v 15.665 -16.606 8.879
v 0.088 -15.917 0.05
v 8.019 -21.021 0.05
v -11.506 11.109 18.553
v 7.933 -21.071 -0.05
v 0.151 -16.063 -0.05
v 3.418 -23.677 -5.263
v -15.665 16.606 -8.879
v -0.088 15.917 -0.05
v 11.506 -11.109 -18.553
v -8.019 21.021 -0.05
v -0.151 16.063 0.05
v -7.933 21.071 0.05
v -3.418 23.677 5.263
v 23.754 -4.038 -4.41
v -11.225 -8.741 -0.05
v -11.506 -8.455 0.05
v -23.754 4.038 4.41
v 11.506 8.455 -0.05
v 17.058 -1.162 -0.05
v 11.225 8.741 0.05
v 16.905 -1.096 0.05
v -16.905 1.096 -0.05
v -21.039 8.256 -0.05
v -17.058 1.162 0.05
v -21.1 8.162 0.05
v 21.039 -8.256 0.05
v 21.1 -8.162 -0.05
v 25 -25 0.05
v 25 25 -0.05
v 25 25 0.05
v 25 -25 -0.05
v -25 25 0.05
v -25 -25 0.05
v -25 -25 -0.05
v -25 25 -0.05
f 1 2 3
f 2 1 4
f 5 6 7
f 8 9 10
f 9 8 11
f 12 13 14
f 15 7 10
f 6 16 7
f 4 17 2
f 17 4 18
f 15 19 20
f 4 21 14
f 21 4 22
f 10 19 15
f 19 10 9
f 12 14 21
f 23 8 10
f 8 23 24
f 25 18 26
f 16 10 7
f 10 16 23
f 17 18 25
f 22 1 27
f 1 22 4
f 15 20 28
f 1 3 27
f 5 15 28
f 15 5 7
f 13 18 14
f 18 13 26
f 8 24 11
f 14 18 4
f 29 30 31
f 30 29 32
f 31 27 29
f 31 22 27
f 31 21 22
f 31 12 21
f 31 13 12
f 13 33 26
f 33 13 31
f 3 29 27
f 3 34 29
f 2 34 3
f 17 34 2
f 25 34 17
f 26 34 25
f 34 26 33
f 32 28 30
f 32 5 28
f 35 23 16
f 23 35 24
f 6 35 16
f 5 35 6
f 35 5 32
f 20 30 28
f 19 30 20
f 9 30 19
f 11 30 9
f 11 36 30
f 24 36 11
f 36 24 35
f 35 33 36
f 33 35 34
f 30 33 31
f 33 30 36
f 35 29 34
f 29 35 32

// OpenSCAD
cube_1_width = 20;
cube_1_depth = 40;
cube_1_height = 20;

buildplate_1_width = 50;
buildplate_1_depth = 50;
buildplate_1_height = 0.1;


rotate([20,-45,30])
cube([cube_1_width,
      cube_1_depth,
      cube_1_height], 
      center=true);

color([1,0,0])
cube([buildplate_1_width,
                        buildplate_1_depth,
                        buildplate_1_height], 
                        center=true);
